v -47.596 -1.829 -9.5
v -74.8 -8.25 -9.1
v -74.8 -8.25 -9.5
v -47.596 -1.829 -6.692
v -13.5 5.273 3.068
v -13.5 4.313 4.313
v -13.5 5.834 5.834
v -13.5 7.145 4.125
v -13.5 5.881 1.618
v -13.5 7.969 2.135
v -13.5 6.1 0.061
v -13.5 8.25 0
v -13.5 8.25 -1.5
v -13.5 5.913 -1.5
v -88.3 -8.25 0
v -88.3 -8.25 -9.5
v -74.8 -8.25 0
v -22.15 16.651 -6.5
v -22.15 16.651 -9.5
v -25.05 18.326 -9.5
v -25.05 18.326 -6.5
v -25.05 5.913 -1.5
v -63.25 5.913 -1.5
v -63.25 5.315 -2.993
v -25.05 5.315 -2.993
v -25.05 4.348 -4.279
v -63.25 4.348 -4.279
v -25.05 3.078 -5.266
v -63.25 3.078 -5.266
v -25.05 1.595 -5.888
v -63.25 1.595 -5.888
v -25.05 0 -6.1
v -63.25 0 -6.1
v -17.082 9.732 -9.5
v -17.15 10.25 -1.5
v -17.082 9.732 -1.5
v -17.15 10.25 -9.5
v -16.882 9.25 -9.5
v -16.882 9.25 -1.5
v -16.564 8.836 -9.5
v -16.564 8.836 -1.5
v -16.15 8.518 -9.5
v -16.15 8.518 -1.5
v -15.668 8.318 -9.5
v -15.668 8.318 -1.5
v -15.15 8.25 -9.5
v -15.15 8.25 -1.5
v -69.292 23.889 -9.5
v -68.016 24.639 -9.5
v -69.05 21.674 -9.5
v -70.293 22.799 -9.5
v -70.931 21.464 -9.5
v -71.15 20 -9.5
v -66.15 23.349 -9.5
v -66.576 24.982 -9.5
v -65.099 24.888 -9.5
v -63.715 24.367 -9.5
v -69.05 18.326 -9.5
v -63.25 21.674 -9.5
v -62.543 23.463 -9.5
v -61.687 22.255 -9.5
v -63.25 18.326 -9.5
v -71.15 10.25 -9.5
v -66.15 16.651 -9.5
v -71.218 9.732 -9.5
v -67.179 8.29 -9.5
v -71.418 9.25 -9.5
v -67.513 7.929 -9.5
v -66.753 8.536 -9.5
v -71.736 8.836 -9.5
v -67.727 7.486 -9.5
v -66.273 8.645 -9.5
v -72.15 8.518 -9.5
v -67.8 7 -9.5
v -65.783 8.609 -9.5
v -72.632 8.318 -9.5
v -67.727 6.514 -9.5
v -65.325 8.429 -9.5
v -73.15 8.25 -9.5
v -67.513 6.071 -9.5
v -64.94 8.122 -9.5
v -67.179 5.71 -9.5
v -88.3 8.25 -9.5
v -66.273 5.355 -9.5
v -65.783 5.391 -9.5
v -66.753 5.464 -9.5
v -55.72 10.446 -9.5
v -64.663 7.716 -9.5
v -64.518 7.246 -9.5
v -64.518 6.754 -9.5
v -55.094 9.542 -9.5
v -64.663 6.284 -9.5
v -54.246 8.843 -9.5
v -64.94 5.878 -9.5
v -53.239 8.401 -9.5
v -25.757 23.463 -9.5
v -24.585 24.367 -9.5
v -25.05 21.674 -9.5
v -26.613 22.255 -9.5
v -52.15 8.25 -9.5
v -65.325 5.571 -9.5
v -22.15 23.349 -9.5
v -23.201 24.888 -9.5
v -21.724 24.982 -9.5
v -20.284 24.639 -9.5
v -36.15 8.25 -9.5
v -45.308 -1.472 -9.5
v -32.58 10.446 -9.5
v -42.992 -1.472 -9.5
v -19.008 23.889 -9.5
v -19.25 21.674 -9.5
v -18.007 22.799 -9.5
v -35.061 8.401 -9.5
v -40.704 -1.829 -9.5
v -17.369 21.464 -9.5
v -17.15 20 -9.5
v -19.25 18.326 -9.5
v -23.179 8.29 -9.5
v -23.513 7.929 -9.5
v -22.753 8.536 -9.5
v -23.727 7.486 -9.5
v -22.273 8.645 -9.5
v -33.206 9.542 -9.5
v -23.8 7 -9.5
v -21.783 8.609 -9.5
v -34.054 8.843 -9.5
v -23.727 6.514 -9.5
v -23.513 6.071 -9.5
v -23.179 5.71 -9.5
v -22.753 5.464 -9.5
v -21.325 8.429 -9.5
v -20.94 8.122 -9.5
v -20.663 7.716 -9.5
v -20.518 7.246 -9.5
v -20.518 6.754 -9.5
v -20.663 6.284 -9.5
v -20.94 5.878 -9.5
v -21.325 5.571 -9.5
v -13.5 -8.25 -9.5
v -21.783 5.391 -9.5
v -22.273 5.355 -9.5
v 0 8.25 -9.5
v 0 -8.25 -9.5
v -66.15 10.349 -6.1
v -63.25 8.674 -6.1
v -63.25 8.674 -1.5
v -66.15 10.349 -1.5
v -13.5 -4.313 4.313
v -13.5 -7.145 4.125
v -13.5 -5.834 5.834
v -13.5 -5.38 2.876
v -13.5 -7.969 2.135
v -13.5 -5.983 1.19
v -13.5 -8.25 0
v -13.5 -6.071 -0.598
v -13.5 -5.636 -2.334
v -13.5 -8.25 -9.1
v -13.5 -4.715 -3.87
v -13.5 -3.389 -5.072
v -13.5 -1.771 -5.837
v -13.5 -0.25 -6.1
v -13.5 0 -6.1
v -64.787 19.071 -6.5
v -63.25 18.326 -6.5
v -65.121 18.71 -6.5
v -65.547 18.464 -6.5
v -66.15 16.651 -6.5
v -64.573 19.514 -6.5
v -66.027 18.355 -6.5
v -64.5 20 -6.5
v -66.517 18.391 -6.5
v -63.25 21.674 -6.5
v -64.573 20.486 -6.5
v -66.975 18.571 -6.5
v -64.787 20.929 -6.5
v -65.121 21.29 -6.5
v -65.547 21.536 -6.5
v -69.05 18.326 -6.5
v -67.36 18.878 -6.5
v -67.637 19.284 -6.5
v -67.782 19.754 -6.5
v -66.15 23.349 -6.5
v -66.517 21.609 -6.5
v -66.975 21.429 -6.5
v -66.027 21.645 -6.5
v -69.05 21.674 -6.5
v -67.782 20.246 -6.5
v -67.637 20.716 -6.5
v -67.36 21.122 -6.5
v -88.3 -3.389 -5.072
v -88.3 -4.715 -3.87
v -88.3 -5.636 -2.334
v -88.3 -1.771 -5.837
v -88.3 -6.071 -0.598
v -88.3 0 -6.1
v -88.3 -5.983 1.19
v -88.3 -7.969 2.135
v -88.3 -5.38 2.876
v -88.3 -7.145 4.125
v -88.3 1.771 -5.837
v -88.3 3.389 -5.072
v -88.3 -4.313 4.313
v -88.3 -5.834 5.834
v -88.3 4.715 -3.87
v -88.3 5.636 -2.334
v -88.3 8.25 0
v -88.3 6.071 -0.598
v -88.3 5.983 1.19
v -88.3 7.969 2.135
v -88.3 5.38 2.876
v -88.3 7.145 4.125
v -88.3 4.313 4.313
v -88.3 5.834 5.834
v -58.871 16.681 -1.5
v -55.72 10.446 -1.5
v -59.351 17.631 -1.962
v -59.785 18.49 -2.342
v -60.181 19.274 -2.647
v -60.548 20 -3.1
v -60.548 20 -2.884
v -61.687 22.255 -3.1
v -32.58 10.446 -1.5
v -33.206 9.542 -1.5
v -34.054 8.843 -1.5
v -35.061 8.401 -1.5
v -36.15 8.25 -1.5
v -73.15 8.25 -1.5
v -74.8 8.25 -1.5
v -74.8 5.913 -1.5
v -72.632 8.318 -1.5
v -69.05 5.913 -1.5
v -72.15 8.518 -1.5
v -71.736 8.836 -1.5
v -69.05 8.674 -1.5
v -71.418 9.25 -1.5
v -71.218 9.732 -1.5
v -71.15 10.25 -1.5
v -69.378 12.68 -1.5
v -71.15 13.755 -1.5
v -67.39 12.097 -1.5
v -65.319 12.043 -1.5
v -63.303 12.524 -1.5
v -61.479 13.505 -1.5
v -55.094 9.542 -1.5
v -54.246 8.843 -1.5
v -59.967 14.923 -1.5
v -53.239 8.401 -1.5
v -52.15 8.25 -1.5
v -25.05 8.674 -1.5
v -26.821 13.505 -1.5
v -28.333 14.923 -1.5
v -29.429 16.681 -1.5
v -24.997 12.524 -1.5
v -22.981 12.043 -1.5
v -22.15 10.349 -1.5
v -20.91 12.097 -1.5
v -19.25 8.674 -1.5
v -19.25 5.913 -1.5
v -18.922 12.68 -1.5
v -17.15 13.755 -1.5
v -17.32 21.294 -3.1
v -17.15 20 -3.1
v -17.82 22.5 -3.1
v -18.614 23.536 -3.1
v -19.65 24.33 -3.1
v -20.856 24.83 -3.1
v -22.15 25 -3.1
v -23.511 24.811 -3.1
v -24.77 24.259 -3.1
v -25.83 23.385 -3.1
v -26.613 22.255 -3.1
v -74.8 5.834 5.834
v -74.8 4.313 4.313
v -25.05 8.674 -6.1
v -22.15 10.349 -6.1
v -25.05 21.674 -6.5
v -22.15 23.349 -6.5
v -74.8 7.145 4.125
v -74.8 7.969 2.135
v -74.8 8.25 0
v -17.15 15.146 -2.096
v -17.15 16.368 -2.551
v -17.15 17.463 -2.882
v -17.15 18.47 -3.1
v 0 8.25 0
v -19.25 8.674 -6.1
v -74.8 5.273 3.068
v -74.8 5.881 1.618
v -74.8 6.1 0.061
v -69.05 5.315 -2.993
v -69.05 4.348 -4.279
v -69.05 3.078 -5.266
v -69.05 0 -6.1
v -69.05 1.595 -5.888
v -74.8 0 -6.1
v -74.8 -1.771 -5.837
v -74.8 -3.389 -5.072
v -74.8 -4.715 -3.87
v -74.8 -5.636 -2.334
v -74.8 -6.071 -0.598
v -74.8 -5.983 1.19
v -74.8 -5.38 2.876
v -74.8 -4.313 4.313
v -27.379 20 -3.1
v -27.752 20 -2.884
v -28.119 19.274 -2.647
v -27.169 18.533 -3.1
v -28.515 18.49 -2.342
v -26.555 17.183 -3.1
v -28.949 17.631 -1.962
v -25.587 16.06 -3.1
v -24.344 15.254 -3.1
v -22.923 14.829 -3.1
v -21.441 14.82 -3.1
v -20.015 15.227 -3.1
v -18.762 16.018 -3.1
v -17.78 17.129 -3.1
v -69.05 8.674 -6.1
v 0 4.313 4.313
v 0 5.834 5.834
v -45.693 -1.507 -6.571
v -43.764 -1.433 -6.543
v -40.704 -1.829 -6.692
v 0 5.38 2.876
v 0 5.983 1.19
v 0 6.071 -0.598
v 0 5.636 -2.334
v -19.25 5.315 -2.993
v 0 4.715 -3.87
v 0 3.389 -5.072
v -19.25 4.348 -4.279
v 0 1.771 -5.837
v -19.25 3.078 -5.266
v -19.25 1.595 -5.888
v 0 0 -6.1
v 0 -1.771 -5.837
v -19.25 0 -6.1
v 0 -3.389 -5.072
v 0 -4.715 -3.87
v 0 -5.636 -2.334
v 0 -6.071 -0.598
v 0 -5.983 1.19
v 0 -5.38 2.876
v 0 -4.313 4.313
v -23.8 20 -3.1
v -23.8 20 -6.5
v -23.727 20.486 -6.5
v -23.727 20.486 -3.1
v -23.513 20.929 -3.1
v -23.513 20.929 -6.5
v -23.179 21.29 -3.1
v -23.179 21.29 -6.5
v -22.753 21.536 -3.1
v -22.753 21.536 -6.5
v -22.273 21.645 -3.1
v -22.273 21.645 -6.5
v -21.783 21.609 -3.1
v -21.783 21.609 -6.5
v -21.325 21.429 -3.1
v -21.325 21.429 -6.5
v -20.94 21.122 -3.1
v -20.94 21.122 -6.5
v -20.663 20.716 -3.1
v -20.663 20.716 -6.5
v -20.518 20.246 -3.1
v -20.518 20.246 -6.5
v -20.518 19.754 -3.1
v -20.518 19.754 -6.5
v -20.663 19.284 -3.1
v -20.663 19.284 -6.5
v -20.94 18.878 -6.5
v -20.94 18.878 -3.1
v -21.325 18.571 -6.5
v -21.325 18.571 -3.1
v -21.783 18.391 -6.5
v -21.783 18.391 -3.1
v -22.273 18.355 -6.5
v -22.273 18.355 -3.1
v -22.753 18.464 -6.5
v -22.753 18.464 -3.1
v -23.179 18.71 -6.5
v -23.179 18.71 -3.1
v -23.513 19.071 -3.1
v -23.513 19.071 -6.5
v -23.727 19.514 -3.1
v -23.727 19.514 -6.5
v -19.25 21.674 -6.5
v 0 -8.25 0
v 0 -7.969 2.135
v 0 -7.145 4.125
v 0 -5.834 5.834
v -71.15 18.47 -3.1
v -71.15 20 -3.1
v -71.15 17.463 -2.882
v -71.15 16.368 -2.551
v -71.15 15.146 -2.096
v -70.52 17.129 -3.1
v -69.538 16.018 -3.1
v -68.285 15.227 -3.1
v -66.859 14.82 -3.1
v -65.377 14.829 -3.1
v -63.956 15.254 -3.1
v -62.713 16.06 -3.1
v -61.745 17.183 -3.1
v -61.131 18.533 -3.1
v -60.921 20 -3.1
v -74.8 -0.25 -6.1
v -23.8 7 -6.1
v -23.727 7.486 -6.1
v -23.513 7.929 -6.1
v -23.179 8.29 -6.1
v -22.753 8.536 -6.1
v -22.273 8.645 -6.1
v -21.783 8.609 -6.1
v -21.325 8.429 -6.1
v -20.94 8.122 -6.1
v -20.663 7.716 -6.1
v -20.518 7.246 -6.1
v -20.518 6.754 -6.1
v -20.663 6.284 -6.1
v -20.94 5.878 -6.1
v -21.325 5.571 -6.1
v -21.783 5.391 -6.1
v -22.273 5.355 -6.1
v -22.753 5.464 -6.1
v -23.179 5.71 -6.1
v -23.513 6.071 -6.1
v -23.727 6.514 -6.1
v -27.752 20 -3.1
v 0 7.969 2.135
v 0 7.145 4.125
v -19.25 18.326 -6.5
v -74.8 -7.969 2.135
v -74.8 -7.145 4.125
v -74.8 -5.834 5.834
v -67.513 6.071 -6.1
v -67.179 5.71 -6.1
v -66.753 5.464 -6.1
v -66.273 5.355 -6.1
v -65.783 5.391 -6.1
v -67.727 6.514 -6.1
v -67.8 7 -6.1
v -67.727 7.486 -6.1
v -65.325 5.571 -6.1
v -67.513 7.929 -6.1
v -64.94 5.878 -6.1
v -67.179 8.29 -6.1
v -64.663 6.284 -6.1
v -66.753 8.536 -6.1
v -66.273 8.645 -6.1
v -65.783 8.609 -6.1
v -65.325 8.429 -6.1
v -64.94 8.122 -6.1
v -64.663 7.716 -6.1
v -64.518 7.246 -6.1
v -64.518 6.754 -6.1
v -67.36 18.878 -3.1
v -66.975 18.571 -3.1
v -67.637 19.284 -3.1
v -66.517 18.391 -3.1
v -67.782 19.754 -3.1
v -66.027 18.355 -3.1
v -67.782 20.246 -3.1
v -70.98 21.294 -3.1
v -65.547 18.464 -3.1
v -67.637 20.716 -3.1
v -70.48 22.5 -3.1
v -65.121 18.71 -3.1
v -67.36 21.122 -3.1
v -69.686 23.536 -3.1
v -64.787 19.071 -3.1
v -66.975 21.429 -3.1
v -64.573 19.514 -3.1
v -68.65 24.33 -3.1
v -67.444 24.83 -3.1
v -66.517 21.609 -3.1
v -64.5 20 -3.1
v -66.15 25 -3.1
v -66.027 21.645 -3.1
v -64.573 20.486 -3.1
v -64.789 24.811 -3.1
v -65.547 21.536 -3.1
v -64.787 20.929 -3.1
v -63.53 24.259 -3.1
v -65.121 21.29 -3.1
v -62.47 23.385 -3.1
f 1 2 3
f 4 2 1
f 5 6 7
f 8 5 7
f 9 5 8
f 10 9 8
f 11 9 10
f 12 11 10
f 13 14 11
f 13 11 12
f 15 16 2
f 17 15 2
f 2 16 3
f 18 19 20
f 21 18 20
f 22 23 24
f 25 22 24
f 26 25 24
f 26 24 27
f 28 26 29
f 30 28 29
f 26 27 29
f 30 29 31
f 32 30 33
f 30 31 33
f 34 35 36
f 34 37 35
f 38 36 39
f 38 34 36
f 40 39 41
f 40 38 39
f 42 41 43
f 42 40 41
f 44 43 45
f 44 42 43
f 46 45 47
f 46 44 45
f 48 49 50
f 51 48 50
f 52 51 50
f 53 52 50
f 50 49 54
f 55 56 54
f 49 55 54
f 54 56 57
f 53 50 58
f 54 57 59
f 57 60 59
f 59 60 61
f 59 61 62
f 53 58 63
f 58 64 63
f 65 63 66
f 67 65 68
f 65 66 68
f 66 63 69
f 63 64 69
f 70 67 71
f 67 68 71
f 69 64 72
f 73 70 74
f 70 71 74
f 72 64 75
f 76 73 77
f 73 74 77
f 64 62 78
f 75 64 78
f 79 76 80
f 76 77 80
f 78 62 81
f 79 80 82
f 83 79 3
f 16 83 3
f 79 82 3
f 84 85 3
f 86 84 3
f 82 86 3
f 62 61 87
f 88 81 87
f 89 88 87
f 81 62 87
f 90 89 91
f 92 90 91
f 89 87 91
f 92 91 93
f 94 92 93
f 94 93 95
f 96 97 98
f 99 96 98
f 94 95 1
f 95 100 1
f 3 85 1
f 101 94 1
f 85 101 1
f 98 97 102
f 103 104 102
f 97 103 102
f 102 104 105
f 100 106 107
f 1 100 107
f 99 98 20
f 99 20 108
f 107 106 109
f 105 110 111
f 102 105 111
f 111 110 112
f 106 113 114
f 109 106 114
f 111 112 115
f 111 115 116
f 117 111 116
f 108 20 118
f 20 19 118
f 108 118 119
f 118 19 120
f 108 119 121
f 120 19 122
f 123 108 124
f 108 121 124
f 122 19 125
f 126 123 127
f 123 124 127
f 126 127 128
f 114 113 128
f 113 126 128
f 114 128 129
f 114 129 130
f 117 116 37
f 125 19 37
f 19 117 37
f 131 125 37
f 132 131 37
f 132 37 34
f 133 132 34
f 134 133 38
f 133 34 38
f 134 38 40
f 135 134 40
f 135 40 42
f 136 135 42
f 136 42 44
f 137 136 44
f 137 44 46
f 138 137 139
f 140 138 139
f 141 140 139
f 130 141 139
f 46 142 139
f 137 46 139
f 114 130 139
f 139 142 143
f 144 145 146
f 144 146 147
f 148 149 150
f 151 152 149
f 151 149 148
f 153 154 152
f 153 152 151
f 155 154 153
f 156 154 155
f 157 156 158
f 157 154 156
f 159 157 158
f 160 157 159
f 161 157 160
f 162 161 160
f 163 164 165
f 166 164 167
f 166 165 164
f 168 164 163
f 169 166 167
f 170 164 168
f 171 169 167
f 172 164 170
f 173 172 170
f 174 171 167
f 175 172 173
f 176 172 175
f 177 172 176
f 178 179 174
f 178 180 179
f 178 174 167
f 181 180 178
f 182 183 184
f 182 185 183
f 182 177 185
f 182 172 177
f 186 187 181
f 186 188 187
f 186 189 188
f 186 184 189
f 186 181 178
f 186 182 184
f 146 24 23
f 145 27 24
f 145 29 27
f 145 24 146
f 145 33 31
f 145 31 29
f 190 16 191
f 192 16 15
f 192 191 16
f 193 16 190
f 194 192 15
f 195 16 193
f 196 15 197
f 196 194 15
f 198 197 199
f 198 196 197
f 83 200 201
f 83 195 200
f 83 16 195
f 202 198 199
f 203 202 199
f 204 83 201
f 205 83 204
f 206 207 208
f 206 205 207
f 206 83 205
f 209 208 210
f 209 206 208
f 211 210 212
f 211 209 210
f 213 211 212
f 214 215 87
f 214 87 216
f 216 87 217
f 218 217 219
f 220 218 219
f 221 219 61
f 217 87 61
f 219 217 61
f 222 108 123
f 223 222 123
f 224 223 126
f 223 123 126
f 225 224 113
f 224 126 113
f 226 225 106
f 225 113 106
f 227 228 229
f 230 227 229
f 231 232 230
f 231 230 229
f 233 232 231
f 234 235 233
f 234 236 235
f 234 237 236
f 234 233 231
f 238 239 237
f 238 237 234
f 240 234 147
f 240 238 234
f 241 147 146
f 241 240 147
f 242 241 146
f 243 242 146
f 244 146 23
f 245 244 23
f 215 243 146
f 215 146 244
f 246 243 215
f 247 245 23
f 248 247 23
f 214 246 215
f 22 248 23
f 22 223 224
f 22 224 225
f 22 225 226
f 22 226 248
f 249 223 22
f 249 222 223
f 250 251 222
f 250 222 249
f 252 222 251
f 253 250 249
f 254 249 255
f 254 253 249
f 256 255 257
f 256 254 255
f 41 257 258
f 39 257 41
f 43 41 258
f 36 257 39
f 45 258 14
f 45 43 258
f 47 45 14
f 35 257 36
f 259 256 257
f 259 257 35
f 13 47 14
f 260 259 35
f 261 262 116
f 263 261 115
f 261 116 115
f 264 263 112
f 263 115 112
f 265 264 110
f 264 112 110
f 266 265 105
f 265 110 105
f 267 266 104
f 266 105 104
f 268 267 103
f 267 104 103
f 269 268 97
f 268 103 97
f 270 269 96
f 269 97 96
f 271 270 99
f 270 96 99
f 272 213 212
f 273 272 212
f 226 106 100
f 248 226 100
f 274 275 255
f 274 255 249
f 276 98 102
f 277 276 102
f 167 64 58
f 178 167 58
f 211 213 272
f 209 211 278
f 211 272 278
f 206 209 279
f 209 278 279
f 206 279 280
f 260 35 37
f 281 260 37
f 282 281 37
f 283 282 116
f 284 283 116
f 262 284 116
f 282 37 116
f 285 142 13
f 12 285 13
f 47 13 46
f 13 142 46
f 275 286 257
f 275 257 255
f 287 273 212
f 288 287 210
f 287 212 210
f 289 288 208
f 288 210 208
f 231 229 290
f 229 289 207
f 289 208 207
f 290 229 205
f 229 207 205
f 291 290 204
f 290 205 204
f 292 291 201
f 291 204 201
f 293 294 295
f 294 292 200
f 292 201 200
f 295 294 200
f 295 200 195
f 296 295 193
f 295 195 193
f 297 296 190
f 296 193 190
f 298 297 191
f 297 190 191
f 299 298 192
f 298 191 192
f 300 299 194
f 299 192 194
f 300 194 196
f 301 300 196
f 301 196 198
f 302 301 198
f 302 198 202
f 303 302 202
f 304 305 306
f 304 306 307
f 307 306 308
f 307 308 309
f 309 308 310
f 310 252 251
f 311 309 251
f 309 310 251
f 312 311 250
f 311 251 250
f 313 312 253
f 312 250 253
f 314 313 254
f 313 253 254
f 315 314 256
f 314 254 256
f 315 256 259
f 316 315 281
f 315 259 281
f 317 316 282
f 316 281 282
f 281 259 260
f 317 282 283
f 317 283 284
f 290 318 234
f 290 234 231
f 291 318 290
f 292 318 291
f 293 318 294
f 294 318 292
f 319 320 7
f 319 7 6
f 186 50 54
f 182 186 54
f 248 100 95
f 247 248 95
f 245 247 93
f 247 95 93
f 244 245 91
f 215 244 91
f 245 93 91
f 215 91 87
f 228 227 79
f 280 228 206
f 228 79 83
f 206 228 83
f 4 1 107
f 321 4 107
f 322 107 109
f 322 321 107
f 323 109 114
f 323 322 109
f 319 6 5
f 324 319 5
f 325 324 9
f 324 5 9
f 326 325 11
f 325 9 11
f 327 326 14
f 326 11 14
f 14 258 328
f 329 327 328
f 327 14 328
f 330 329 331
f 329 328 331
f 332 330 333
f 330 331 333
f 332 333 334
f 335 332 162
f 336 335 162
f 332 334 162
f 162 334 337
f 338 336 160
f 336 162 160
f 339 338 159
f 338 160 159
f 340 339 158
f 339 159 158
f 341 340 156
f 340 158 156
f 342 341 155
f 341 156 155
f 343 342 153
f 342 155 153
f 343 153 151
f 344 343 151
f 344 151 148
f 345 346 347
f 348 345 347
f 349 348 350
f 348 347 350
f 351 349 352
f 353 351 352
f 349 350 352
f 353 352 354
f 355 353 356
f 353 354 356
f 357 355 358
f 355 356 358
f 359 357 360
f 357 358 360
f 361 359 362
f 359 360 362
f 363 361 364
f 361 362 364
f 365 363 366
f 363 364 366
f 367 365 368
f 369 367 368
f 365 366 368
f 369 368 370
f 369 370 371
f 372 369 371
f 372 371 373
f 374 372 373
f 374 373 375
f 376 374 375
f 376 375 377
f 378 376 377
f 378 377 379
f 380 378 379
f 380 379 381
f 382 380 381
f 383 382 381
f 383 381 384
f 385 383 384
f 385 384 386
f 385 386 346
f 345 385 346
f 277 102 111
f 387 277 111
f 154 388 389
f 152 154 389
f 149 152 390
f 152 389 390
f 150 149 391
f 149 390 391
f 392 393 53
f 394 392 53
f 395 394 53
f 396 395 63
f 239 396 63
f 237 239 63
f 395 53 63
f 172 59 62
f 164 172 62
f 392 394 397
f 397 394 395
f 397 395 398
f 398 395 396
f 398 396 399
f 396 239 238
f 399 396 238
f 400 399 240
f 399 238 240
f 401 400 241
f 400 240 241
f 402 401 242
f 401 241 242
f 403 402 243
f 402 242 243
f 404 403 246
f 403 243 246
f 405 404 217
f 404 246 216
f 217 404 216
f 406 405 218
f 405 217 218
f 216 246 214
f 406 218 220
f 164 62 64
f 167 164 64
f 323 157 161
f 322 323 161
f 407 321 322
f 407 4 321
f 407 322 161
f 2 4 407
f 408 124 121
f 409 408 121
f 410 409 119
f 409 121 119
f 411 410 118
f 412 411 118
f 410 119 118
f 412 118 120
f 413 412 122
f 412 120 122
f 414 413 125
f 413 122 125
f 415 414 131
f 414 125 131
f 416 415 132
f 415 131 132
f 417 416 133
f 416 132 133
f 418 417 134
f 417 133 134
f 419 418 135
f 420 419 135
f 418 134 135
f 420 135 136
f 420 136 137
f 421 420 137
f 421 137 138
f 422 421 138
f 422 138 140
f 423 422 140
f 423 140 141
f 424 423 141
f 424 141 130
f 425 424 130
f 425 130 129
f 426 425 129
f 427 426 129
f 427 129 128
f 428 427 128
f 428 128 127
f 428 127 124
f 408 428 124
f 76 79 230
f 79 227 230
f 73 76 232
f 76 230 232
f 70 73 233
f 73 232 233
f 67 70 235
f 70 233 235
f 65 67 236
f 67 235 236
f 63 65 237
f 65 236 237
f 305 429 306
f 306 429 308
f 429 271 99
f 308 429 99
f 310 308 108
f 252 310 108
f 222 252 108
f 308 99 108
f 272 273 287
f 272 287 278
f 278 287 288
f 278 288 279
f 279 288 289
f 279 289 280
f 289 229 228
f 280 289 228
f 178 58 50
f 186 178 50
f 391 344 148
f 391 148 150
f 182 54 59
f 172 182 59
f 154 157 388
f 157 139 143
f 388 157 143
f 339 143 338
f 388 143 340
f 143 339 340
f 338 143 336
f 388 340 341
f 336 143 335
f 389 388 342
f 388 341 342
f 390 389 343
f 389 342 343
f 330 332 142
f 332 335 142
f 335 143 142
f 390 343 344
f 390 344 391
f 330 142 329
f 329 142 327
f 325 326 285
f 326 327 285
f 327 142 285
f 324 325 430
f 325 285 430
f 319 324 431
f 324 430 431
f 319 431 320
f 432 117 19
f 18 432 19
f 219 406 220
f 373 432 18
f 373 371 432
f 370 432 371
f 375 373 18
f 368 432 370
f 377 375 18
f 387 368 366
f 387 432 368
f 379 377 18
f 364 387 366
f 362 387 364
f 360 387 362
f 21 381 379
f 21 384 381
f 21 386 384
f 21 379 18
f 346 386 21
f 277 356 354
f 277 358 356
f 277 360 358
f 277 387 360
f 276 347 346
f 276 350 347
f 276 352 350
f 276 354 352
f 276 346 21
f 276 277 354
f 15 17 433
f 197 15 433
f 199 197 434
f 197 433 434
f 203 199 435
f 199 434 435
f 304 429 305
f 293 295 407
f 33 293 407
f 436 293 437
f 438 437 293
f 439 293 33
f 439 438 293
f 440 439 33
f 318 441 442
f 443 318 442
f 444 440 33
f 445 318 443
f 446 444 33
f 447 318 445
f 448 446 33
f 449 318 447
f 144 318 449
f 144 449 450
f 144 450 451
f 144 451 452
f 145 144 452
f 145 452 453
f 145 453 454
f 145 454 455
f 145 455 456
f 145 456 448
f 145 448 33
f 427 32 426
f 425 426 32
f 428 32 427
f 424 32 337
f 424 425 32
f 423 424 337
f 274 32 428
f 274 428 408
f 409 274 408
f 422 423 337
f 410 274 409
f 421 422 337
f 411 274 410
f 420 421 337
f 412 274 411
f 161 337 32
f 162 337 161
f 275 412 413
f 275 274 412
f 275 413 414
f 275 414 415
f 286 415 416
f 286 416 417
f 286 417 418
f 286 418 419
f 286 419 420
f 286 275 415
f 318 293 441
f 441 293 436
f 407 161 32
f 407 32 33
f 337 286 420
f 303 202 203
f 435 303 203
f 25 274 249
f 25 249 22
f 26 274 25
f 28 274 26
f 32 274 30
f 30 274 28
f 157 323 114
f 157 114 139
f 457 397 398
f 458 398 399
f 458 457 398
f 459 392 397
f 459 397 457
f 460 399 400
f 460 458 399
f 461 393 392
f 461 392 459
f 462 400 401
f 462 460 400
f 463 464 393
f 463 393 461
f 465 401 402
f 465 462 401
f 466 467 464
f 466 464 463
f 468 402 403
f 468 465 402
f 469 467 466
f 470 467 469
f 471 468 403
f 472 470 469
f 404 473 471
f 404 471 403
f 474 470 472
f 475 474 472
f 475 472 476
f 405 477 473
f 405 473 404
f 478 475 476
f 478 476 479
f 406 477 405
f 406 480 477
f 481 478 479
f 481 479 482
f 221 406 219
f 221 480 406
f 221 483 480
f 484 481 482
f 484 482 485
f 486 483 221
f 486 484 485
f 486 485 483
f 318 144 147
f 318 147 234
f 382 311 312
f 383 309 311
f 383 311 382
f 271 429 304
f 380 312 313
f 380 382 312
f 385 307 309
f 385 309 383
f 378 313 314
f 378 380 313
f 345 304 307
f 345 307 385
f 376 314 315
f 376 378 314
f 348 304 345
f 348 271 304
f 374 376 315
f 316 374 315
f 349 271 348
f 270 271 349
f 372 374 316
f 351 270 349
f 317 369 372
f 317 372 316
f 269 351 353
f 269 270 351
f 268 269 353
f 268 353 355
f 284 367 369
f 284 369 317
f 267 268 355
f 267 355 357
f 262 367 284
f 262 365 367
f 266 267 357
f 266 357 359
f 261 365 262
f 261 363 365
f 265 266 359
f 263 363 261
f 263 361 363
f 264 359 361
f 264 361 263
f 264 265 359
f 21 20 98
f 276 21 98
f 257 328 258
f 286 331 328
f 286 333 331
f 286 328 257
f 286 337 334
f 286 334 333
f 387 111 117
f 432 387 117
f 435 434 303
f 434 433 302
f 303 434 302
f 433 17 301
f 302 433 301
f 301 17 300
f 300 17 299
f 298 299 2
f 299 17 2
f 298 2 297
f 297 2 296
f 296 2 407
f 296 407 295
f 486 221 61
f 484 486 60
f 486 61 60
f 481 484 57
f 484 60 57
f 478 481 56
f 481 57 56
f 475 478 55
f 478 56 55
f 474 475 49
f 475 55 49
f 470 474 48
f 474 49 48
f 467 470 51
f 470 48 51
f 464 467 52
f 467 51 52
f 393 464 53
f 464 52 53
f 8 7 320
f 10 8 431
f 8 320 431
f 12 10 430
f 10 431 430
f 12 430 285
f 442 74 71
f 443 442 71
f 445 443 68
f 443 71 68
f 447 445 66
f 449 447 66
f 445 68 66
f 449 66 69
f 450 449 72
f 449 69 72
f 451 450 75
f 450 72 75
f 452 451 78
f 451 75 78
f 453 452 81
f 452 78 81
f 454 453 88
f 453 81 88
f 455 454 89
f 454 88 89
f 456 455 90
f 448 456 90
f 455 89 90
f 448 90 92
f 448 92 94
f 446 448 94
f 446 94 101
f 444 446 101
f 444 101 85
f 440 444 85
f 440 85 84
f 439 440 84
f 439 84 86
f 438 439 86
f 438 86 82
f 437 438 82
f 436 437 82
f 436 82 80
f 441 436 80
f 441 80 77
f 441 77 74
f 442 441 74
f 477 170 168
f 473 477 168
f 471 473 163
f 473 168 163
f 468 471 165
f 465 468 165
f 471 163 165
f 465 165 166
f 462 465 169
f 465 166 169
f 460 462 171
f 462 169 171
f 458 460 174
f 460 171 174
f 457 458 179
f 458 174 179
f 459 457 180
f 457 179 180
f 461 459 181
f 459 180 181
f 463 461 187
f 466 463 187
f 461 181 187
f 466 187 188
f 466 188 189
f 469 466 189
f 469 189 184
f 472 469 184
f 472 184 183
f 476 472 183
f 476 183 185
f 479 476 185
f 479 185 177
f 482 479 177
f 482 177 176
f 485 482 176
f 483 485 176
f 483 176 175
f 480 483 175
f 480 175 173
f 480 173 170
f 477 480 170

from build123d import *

# Parameters (mm, degrees)
BOSS_EXTRUDE1_DEPTH = 88.3
SKETCH6_R           = 1.65
BOSS_EXTRUDE2_DEPTH = 8
CUT_EXTRUDE1_DEPTH  = 93.261259475
SKETCH8_W           = 61.3
SKETCH8_H           = 21.483950942
CUT_EXTRUDE2_DEPTH  = 93.118890571
SKETCH9_W           = 61.3
SKETCH9_H           = 11.699409457
CUT_EXTRUDE3_DEPTH  = 93.543511645
SKETCH10_R          = 1.65
CUT_EXTRUDE4_DEPTH  = 94.043055829
CHAMFER1_SIZE       = 8
CHAMFER1_SIZE2      = 3
CUT_EXTRUDE5_DEPTH  = 93.54351174
FILLET1_R           = 2
CUT_EXTRUDE6_DEPTH  = 3
CUT_EXTRUDE7_START  = -4.6
CUT_EXTRUDE7_DEPTH  = 4.6
CUT_EXTRUDE8_START  = -1.6
CUT_EXTRUDE8_DEPTH  = 1.6
CHAMFER2_SIZE       = 1.732050808
CHAMFER2_SIZE_2     = 3


with BuildPart() as part:
    # Sketch1 → Boss-Extrude1 (new body)
    with BuildSketch(Plane.ZY):
        with BuildLine():
            Line((-9.5, 8.25), (-9.5, -8.25))
            Line((-9.5, -8.25), (0, -8.25))
            ThreePointArc((0, -8.25), (8.25, 0), (0, 8.25))
            Line((0, 8.25), (-9.5, 8.25))
        make_face()
    extrude(amount=BOSS_EXTRUDE1_DEPTH)

    # Sketch6 → Boss-Extrude2 (add)
    with BuildSketch(Plane(origin=(0, 0, -9.5), x_dir=(-1, 0, 0), z_dir=(0, 0, -1))):
        with BuildLine():
            Line((17.15, -8.25), (17.15, 20))
            ThreePointArc((17.15, 20), (20.99096395, 24.863808737), (26.612654174, 22.254931867))
            Line((26.612654174, 22.254931867), (32.579554775, 10.446054507))
            ThreePointArc((32.579554775, 10.446054507), (34.053942202, 8.842964487), (36.149678114, 8.25))
            Line((36.149678114, 8.25), (52.150321886, 8.25))
            ThreePointArc((52.150321886, 8.25), (54.246057798, 8.842964487), (55.720445225, 10.446054507))
            Line((55.720445225, 10.446054507), (61.687345826, 22.254931867))
            ThreePointArc((61.687345826, 22.254931867), (67.30903605, 24.863808737), (71.15, 20))
            Line((71.15, 20), (71.15, -8.25))
            Line((71.15, -8.25), (17.15, -8.25))
        make_face()
        with Locations((22.15, 20)):
            Circle(SKETCH6_R, mode=Mode.SUBTRACT)
        with Locations(Location((66.15, 20, 0), (0, 0, 180))):
            Circle(SKETCH6_R, mode=Mode.SUBTRACT)
    extrude(amount=-BOSS_EXTRUDE2_DEPTH)

    # Sketch7 → Cut-Extrude1 (cut, through all)
    with BuildSketch(Plane.ZY.offset(88.3)):
        with BuildLine():
            Line((13.481907846, 13.481907846), (4.313351365, 4.313351365))
            ThreePointArc((4.313351365, 4.313351365), (-6.1, 0), (4.313351365, -4.313351365))
            Line((4.313351365, -4.313351365), (13.481907846, -13.481907846))
            Line((13.481907846, -13.481907846), (13.481907846, 13.481907846))
        make_face()
    extrude(amount=-CUT_EXTRUDE1_DEPTH, mode=Mode.SUBTRACT)

    # Sketch8 → Cut-Extrude2 (cut, through all)
    with BuildSketch(Plane.XY.offset(-1.5)):
        with Locations((-44.15, -2.491975471)):
            Rectangle(SKETCH8_W, SKETCH8_H)
    extrude(amount=CUT_EXTRUDE2_DEPTH, mode=Mode.SUBTRACT)

    # Sketch9 → Cut-Extrude3 (cut, through all)
    with BuildSketch(Plane(origin=(0, 0, -6.1), x_dir=(-1, 0, 0), z_dir=(0, 0, -1))):
        with Locations((44.15, -5.849704729)):
            Rectangle(SKETCH9_W, SKETCH9_H)
    extrude(amount=-CUT_EXTRUDE3_DEPTH, mode=Mode.SUBTRACT)

    # Sketch10 → Cut-Extrude4 (cut, through all)
    with BuildSketch(Plane(origin=(0, 0, -9.5), x_dir=(-1, 0, 0), z_dir=(0, 0, -1))):
        with Locations((22.15, 7)):
            Circle(SKETCH10_R)
        with Locations((66.15, 7)):
            Circle(SKETCH10_R)
    extrude(amount=-CUT_EXTRUDE4_DEPTH, mode=Mode.SUBTRACT)

    # Chamfer1
    chamfer1_edges = [part.edges().sort_by_distance(p)[0] for p in [
        (-44.15, -8.25, -6.1),
    ]]
    chamfer1_side = [part.faces().sort_by_distance(p)[0] for p in [
        (-44.15, -4.125, -6.1),
    ]]
    chamfer(chamfer1_edges, length=CHAMFER1_SIZE, length2=CHAMFER1_SIZE2, reference=chamfer1_side[0])

    # Sketch11 → Cut-Extrude5 (cut, through all)
    with BuildSketch(Plane(origin=(0, 0, -6.1), x_dir=(-1, 0, 0), z_dir=(0, 0, -1))):
        with BuildLine():
            Line((74.8, -8.25), (47.5958626, -1.828822614))
            ThreePointArc((47.5958626, -1.828822614), (44.15, -1.427659244), (40.7041374, -1.828822614))
            Line((40.7041374, -1.828822614), (13.5, -8.25))
            Line((13.5, -8.25), (13.5, -16.427659244))
            Line((13.5, -16.427659244), (74.8, -16.427659244))
            Line((74.8, -16.427659244), (74.8, -8.25))
        make_face()
    extrude(amount=CUT_EXTRUDE5_DEPTH, mode=Mode.SUBTRACT)

    # Fillet1
    fillet1_edges = [part.edges().sort_by_distance(p)[0] for p in [
        (-17.15, 8.25, -5.5),
        (-71.15, 8.25, -5.5),
    ]]
    fillet(fillet1_edges, radius=FILLET1_R)

    # Sketch12 → Cut-Extrude6 (cut)
    with BuildSketch(Plane(origin=(0, 0, -9.5), x_dir=(-1, 0, 0), z_dir=(0, 0, -1))):
        Polygon((22.15, 16.651368439), (25.05, 18.325684219), (25.05, 21.674315781), (22.15, 23.348631561), (19.25, 21.674315781), (19.25, 18.325684219), align=None)
        Polygon((66.15, 16.651368439), (69.05, 18.325684219), (69.05, 21.674315781), (66.15, 23.348631561), (63.25, 21.674315781), (63.25, 18.325684219), align=None)
    extrude(amount=-CUT_EXTRUDE6_DEPTH, mode=Mode.SUBTRACT)

    # Sketch13 → Cut-Extrude7 (cut)
    with BuildSketch(Plane.XY.offset(-1.5).offset(CUT_EXTRUDE7_START)):
        Polygon((-69.05, -2.12397244), (-63.25, -2.12397244), (-63.25, 8.674315781), (-66.15, 10.348631561), (-69.05, 8.674315781), align=None)
        Polygon((-25.05, -2.12397244), (-19.25, -2.12397244), (-19.25, 8.674315781), (-22.15, 10.348631561), (-25.05, 8.674315781), align=None)
    extrude(amount=CUT_EXTRUDE7_DEPTH, mode=Mode.SUBTRACT)

    # Sketch14 → Cut-Extrude8 (cut)
    with BuildSketch(Plane.XY.offset(-1.5).offset(CUT_EXTRUDE8_START)):
        with BuildLine():
            Line((-61.15, 20), (-27.15, 20))
            ThreePointArc((-27.15, 20), (-18.614466094, 16.464466094), (-22.15, 25))
            Line((-22.15, 25), (-66.15, 25))
            ThreePointArc((-66.15, 25), (-69.685533906, 16.464466094), (-61.15, 20))
        make_face()
    extrude(amount=CUT_EXTRUDE8_DEPTH, mode=Mode.SUBTRACT)

    # Chamfer2
    # the kernel refuses this chamfer: 3, 1.732050808 mm, written as the material it takes off along each edge
    with BuildSketch(Plane(origin=(-22.15, 20, -1.5), x_dir=(-0.016047871272964892, 0.9998712246222542, 0), z_dir=(0.9998712246222542, 0.016047871272964892, 0))) as chamfer2_piece_1_section:
        Polygon((5, -CHAMFER2_SIZE), (5 + CHAMFER2_SIZE_2, 0), (5, 0), align=None)
    chamfer2_piece_1 = revolve(axis=Axis((-22.15, 20, -1.5), (0, 0, 1)), revolution_arc=358.160970471, mode=Mode.PRIVATE)
    chamfer2_piece_1 = split(chamfer2_piece_1, bisect_by=Plane(origin=(-17.15, 16.005759066, -2.231169886), z_dir=(-1, 0, 0)), keep=Keep.TOP, mode=Mode.PRIVATE)
    chamfer2_piece_1 = split(chamfer2_piece_1, bisect_by=Plane(origin=(-27.459187994, 16.005759066, -3.1), z_dir=(0, 0, 1)), keep=Keep.TOP, mode=Mode.PRIVATE)
    add(chamfer2_piece_1, mode=Mode.SUBTRACT)
    with BuildSketch(Plane(origin=(-22.15, 20, -1.5), x_dir=(-0.016047871272964892, 0.9998712246222542, 0), z_dir=(0.9998712246222542, 0.016047871272964892, 0))) as chamfer2_piece_2_section:
        Polygon((5, -CHAMFER2_SIZE), (5 + CHAMFER2_SIZE_2, 0), (5, 0), align=None)
    chamfer2_piece_2 = revolve(axis=Axis((-22.15, 20, -1.5), (0, 0, 1)), revolution_arc=358.160970471, mode=Mode.PRIVATE)
    chamfer2_piece_2 = split(chamfer2_piece_2, bisect_by=Plane(origin=(-17.15, 20, -1.92443376), z_dir=(1, 0, 0)), keep=Keep.TOP, mode=Mode.PRIVATE)
    chamfer2_piece_2 = split(chamfer2_piece_2, bisect_by=Plane(origin=(-16.215864926, 20, -3.1), z_dir=(0, 0, 1)), keep=Keep.TOP, mode=Mode.PRIVATE)
    add(chamfer2_piece_2, mode=Mode.SUBTRACT)
    with BuildSketch(Plane(origin=(-66.15, 20, -1.5), x_dir=(-0.016047871272962772, 0.9998712246222542, 0), z_dir=(0.9998712246222542, 0.016047871272962772, 0))) as chamfer2_piece_3_section:
        Polygon((5, -CHAMFER2_SIZE), (5 + CHAMFER2_SIZE_2, 0), (5, 0), align=None)
    chamfer2_piece_3 = revolve(axis=Axis((-66.15, 20, -1.5), (0, 0, 1)), revolution_arc=358.160970471, mode=Mode.PRIVATE)
    chamfer2_piece_3 = split(chamfer2_piece_3, bisect_by=Plane(origin=(-70.144240933, 25.309187993, -3.1), z_dir=(0, 0, 1)), keep=Keep.TOP, mode=Mode.PRIVATE)
    chamfer2_piece_3 = split(chamfer2_piece_3, bisect_by=Plane(origin=(-71.15, 25.309187993, -2.231169885), z_dir=(1, 0, 0)), keep=Keep.TOP, mode=Mode.PRIVATE)
    add(chamfer2_piece_3, mode=Mode.SUBTRACT)
    with BuildSketch(Plane(origin=(-66.15, 20, -1.5), x_dir=(-0.016047871272962772, 0.9998712246222542, 0), z_dir=(0.9998712246222542, 0.016047871272962772, 0))) as chamfer2_piece_4_section:
        Polygon((5, -CHAMFER2_SIZE), (5 + CHAMFER2_SIZE_2, 0), (5, 0), align=None)
    chamfer2_piece_4 = revolve(axis=Axis((-66.15, 20, -1.5), (0, 0, 1)), revolution_arc=358.160970471, mode=Mode.PRIVATE)
    chamfer2_piece_4 = split(chamfer2_piece_4, bisect_by=Plane(origin=(-72.084135074, 20, -3.1), z_dir=(0, 0, 1)), keep=Keep.TOP, mode=Mode.PRIVATE)
    chamfer2_piece_4 = split(chamfer2_piece_4, bisect_by=Plane(origin=(-71.15, 20, -1.92443376), z_dir=(-1, 0, 0)), keep=Keep.TOP, mode=Mode.PRIVATE)
    add(chamfer2_piece_4, mode=Mode.SUBTRACT)


solid = part.part
